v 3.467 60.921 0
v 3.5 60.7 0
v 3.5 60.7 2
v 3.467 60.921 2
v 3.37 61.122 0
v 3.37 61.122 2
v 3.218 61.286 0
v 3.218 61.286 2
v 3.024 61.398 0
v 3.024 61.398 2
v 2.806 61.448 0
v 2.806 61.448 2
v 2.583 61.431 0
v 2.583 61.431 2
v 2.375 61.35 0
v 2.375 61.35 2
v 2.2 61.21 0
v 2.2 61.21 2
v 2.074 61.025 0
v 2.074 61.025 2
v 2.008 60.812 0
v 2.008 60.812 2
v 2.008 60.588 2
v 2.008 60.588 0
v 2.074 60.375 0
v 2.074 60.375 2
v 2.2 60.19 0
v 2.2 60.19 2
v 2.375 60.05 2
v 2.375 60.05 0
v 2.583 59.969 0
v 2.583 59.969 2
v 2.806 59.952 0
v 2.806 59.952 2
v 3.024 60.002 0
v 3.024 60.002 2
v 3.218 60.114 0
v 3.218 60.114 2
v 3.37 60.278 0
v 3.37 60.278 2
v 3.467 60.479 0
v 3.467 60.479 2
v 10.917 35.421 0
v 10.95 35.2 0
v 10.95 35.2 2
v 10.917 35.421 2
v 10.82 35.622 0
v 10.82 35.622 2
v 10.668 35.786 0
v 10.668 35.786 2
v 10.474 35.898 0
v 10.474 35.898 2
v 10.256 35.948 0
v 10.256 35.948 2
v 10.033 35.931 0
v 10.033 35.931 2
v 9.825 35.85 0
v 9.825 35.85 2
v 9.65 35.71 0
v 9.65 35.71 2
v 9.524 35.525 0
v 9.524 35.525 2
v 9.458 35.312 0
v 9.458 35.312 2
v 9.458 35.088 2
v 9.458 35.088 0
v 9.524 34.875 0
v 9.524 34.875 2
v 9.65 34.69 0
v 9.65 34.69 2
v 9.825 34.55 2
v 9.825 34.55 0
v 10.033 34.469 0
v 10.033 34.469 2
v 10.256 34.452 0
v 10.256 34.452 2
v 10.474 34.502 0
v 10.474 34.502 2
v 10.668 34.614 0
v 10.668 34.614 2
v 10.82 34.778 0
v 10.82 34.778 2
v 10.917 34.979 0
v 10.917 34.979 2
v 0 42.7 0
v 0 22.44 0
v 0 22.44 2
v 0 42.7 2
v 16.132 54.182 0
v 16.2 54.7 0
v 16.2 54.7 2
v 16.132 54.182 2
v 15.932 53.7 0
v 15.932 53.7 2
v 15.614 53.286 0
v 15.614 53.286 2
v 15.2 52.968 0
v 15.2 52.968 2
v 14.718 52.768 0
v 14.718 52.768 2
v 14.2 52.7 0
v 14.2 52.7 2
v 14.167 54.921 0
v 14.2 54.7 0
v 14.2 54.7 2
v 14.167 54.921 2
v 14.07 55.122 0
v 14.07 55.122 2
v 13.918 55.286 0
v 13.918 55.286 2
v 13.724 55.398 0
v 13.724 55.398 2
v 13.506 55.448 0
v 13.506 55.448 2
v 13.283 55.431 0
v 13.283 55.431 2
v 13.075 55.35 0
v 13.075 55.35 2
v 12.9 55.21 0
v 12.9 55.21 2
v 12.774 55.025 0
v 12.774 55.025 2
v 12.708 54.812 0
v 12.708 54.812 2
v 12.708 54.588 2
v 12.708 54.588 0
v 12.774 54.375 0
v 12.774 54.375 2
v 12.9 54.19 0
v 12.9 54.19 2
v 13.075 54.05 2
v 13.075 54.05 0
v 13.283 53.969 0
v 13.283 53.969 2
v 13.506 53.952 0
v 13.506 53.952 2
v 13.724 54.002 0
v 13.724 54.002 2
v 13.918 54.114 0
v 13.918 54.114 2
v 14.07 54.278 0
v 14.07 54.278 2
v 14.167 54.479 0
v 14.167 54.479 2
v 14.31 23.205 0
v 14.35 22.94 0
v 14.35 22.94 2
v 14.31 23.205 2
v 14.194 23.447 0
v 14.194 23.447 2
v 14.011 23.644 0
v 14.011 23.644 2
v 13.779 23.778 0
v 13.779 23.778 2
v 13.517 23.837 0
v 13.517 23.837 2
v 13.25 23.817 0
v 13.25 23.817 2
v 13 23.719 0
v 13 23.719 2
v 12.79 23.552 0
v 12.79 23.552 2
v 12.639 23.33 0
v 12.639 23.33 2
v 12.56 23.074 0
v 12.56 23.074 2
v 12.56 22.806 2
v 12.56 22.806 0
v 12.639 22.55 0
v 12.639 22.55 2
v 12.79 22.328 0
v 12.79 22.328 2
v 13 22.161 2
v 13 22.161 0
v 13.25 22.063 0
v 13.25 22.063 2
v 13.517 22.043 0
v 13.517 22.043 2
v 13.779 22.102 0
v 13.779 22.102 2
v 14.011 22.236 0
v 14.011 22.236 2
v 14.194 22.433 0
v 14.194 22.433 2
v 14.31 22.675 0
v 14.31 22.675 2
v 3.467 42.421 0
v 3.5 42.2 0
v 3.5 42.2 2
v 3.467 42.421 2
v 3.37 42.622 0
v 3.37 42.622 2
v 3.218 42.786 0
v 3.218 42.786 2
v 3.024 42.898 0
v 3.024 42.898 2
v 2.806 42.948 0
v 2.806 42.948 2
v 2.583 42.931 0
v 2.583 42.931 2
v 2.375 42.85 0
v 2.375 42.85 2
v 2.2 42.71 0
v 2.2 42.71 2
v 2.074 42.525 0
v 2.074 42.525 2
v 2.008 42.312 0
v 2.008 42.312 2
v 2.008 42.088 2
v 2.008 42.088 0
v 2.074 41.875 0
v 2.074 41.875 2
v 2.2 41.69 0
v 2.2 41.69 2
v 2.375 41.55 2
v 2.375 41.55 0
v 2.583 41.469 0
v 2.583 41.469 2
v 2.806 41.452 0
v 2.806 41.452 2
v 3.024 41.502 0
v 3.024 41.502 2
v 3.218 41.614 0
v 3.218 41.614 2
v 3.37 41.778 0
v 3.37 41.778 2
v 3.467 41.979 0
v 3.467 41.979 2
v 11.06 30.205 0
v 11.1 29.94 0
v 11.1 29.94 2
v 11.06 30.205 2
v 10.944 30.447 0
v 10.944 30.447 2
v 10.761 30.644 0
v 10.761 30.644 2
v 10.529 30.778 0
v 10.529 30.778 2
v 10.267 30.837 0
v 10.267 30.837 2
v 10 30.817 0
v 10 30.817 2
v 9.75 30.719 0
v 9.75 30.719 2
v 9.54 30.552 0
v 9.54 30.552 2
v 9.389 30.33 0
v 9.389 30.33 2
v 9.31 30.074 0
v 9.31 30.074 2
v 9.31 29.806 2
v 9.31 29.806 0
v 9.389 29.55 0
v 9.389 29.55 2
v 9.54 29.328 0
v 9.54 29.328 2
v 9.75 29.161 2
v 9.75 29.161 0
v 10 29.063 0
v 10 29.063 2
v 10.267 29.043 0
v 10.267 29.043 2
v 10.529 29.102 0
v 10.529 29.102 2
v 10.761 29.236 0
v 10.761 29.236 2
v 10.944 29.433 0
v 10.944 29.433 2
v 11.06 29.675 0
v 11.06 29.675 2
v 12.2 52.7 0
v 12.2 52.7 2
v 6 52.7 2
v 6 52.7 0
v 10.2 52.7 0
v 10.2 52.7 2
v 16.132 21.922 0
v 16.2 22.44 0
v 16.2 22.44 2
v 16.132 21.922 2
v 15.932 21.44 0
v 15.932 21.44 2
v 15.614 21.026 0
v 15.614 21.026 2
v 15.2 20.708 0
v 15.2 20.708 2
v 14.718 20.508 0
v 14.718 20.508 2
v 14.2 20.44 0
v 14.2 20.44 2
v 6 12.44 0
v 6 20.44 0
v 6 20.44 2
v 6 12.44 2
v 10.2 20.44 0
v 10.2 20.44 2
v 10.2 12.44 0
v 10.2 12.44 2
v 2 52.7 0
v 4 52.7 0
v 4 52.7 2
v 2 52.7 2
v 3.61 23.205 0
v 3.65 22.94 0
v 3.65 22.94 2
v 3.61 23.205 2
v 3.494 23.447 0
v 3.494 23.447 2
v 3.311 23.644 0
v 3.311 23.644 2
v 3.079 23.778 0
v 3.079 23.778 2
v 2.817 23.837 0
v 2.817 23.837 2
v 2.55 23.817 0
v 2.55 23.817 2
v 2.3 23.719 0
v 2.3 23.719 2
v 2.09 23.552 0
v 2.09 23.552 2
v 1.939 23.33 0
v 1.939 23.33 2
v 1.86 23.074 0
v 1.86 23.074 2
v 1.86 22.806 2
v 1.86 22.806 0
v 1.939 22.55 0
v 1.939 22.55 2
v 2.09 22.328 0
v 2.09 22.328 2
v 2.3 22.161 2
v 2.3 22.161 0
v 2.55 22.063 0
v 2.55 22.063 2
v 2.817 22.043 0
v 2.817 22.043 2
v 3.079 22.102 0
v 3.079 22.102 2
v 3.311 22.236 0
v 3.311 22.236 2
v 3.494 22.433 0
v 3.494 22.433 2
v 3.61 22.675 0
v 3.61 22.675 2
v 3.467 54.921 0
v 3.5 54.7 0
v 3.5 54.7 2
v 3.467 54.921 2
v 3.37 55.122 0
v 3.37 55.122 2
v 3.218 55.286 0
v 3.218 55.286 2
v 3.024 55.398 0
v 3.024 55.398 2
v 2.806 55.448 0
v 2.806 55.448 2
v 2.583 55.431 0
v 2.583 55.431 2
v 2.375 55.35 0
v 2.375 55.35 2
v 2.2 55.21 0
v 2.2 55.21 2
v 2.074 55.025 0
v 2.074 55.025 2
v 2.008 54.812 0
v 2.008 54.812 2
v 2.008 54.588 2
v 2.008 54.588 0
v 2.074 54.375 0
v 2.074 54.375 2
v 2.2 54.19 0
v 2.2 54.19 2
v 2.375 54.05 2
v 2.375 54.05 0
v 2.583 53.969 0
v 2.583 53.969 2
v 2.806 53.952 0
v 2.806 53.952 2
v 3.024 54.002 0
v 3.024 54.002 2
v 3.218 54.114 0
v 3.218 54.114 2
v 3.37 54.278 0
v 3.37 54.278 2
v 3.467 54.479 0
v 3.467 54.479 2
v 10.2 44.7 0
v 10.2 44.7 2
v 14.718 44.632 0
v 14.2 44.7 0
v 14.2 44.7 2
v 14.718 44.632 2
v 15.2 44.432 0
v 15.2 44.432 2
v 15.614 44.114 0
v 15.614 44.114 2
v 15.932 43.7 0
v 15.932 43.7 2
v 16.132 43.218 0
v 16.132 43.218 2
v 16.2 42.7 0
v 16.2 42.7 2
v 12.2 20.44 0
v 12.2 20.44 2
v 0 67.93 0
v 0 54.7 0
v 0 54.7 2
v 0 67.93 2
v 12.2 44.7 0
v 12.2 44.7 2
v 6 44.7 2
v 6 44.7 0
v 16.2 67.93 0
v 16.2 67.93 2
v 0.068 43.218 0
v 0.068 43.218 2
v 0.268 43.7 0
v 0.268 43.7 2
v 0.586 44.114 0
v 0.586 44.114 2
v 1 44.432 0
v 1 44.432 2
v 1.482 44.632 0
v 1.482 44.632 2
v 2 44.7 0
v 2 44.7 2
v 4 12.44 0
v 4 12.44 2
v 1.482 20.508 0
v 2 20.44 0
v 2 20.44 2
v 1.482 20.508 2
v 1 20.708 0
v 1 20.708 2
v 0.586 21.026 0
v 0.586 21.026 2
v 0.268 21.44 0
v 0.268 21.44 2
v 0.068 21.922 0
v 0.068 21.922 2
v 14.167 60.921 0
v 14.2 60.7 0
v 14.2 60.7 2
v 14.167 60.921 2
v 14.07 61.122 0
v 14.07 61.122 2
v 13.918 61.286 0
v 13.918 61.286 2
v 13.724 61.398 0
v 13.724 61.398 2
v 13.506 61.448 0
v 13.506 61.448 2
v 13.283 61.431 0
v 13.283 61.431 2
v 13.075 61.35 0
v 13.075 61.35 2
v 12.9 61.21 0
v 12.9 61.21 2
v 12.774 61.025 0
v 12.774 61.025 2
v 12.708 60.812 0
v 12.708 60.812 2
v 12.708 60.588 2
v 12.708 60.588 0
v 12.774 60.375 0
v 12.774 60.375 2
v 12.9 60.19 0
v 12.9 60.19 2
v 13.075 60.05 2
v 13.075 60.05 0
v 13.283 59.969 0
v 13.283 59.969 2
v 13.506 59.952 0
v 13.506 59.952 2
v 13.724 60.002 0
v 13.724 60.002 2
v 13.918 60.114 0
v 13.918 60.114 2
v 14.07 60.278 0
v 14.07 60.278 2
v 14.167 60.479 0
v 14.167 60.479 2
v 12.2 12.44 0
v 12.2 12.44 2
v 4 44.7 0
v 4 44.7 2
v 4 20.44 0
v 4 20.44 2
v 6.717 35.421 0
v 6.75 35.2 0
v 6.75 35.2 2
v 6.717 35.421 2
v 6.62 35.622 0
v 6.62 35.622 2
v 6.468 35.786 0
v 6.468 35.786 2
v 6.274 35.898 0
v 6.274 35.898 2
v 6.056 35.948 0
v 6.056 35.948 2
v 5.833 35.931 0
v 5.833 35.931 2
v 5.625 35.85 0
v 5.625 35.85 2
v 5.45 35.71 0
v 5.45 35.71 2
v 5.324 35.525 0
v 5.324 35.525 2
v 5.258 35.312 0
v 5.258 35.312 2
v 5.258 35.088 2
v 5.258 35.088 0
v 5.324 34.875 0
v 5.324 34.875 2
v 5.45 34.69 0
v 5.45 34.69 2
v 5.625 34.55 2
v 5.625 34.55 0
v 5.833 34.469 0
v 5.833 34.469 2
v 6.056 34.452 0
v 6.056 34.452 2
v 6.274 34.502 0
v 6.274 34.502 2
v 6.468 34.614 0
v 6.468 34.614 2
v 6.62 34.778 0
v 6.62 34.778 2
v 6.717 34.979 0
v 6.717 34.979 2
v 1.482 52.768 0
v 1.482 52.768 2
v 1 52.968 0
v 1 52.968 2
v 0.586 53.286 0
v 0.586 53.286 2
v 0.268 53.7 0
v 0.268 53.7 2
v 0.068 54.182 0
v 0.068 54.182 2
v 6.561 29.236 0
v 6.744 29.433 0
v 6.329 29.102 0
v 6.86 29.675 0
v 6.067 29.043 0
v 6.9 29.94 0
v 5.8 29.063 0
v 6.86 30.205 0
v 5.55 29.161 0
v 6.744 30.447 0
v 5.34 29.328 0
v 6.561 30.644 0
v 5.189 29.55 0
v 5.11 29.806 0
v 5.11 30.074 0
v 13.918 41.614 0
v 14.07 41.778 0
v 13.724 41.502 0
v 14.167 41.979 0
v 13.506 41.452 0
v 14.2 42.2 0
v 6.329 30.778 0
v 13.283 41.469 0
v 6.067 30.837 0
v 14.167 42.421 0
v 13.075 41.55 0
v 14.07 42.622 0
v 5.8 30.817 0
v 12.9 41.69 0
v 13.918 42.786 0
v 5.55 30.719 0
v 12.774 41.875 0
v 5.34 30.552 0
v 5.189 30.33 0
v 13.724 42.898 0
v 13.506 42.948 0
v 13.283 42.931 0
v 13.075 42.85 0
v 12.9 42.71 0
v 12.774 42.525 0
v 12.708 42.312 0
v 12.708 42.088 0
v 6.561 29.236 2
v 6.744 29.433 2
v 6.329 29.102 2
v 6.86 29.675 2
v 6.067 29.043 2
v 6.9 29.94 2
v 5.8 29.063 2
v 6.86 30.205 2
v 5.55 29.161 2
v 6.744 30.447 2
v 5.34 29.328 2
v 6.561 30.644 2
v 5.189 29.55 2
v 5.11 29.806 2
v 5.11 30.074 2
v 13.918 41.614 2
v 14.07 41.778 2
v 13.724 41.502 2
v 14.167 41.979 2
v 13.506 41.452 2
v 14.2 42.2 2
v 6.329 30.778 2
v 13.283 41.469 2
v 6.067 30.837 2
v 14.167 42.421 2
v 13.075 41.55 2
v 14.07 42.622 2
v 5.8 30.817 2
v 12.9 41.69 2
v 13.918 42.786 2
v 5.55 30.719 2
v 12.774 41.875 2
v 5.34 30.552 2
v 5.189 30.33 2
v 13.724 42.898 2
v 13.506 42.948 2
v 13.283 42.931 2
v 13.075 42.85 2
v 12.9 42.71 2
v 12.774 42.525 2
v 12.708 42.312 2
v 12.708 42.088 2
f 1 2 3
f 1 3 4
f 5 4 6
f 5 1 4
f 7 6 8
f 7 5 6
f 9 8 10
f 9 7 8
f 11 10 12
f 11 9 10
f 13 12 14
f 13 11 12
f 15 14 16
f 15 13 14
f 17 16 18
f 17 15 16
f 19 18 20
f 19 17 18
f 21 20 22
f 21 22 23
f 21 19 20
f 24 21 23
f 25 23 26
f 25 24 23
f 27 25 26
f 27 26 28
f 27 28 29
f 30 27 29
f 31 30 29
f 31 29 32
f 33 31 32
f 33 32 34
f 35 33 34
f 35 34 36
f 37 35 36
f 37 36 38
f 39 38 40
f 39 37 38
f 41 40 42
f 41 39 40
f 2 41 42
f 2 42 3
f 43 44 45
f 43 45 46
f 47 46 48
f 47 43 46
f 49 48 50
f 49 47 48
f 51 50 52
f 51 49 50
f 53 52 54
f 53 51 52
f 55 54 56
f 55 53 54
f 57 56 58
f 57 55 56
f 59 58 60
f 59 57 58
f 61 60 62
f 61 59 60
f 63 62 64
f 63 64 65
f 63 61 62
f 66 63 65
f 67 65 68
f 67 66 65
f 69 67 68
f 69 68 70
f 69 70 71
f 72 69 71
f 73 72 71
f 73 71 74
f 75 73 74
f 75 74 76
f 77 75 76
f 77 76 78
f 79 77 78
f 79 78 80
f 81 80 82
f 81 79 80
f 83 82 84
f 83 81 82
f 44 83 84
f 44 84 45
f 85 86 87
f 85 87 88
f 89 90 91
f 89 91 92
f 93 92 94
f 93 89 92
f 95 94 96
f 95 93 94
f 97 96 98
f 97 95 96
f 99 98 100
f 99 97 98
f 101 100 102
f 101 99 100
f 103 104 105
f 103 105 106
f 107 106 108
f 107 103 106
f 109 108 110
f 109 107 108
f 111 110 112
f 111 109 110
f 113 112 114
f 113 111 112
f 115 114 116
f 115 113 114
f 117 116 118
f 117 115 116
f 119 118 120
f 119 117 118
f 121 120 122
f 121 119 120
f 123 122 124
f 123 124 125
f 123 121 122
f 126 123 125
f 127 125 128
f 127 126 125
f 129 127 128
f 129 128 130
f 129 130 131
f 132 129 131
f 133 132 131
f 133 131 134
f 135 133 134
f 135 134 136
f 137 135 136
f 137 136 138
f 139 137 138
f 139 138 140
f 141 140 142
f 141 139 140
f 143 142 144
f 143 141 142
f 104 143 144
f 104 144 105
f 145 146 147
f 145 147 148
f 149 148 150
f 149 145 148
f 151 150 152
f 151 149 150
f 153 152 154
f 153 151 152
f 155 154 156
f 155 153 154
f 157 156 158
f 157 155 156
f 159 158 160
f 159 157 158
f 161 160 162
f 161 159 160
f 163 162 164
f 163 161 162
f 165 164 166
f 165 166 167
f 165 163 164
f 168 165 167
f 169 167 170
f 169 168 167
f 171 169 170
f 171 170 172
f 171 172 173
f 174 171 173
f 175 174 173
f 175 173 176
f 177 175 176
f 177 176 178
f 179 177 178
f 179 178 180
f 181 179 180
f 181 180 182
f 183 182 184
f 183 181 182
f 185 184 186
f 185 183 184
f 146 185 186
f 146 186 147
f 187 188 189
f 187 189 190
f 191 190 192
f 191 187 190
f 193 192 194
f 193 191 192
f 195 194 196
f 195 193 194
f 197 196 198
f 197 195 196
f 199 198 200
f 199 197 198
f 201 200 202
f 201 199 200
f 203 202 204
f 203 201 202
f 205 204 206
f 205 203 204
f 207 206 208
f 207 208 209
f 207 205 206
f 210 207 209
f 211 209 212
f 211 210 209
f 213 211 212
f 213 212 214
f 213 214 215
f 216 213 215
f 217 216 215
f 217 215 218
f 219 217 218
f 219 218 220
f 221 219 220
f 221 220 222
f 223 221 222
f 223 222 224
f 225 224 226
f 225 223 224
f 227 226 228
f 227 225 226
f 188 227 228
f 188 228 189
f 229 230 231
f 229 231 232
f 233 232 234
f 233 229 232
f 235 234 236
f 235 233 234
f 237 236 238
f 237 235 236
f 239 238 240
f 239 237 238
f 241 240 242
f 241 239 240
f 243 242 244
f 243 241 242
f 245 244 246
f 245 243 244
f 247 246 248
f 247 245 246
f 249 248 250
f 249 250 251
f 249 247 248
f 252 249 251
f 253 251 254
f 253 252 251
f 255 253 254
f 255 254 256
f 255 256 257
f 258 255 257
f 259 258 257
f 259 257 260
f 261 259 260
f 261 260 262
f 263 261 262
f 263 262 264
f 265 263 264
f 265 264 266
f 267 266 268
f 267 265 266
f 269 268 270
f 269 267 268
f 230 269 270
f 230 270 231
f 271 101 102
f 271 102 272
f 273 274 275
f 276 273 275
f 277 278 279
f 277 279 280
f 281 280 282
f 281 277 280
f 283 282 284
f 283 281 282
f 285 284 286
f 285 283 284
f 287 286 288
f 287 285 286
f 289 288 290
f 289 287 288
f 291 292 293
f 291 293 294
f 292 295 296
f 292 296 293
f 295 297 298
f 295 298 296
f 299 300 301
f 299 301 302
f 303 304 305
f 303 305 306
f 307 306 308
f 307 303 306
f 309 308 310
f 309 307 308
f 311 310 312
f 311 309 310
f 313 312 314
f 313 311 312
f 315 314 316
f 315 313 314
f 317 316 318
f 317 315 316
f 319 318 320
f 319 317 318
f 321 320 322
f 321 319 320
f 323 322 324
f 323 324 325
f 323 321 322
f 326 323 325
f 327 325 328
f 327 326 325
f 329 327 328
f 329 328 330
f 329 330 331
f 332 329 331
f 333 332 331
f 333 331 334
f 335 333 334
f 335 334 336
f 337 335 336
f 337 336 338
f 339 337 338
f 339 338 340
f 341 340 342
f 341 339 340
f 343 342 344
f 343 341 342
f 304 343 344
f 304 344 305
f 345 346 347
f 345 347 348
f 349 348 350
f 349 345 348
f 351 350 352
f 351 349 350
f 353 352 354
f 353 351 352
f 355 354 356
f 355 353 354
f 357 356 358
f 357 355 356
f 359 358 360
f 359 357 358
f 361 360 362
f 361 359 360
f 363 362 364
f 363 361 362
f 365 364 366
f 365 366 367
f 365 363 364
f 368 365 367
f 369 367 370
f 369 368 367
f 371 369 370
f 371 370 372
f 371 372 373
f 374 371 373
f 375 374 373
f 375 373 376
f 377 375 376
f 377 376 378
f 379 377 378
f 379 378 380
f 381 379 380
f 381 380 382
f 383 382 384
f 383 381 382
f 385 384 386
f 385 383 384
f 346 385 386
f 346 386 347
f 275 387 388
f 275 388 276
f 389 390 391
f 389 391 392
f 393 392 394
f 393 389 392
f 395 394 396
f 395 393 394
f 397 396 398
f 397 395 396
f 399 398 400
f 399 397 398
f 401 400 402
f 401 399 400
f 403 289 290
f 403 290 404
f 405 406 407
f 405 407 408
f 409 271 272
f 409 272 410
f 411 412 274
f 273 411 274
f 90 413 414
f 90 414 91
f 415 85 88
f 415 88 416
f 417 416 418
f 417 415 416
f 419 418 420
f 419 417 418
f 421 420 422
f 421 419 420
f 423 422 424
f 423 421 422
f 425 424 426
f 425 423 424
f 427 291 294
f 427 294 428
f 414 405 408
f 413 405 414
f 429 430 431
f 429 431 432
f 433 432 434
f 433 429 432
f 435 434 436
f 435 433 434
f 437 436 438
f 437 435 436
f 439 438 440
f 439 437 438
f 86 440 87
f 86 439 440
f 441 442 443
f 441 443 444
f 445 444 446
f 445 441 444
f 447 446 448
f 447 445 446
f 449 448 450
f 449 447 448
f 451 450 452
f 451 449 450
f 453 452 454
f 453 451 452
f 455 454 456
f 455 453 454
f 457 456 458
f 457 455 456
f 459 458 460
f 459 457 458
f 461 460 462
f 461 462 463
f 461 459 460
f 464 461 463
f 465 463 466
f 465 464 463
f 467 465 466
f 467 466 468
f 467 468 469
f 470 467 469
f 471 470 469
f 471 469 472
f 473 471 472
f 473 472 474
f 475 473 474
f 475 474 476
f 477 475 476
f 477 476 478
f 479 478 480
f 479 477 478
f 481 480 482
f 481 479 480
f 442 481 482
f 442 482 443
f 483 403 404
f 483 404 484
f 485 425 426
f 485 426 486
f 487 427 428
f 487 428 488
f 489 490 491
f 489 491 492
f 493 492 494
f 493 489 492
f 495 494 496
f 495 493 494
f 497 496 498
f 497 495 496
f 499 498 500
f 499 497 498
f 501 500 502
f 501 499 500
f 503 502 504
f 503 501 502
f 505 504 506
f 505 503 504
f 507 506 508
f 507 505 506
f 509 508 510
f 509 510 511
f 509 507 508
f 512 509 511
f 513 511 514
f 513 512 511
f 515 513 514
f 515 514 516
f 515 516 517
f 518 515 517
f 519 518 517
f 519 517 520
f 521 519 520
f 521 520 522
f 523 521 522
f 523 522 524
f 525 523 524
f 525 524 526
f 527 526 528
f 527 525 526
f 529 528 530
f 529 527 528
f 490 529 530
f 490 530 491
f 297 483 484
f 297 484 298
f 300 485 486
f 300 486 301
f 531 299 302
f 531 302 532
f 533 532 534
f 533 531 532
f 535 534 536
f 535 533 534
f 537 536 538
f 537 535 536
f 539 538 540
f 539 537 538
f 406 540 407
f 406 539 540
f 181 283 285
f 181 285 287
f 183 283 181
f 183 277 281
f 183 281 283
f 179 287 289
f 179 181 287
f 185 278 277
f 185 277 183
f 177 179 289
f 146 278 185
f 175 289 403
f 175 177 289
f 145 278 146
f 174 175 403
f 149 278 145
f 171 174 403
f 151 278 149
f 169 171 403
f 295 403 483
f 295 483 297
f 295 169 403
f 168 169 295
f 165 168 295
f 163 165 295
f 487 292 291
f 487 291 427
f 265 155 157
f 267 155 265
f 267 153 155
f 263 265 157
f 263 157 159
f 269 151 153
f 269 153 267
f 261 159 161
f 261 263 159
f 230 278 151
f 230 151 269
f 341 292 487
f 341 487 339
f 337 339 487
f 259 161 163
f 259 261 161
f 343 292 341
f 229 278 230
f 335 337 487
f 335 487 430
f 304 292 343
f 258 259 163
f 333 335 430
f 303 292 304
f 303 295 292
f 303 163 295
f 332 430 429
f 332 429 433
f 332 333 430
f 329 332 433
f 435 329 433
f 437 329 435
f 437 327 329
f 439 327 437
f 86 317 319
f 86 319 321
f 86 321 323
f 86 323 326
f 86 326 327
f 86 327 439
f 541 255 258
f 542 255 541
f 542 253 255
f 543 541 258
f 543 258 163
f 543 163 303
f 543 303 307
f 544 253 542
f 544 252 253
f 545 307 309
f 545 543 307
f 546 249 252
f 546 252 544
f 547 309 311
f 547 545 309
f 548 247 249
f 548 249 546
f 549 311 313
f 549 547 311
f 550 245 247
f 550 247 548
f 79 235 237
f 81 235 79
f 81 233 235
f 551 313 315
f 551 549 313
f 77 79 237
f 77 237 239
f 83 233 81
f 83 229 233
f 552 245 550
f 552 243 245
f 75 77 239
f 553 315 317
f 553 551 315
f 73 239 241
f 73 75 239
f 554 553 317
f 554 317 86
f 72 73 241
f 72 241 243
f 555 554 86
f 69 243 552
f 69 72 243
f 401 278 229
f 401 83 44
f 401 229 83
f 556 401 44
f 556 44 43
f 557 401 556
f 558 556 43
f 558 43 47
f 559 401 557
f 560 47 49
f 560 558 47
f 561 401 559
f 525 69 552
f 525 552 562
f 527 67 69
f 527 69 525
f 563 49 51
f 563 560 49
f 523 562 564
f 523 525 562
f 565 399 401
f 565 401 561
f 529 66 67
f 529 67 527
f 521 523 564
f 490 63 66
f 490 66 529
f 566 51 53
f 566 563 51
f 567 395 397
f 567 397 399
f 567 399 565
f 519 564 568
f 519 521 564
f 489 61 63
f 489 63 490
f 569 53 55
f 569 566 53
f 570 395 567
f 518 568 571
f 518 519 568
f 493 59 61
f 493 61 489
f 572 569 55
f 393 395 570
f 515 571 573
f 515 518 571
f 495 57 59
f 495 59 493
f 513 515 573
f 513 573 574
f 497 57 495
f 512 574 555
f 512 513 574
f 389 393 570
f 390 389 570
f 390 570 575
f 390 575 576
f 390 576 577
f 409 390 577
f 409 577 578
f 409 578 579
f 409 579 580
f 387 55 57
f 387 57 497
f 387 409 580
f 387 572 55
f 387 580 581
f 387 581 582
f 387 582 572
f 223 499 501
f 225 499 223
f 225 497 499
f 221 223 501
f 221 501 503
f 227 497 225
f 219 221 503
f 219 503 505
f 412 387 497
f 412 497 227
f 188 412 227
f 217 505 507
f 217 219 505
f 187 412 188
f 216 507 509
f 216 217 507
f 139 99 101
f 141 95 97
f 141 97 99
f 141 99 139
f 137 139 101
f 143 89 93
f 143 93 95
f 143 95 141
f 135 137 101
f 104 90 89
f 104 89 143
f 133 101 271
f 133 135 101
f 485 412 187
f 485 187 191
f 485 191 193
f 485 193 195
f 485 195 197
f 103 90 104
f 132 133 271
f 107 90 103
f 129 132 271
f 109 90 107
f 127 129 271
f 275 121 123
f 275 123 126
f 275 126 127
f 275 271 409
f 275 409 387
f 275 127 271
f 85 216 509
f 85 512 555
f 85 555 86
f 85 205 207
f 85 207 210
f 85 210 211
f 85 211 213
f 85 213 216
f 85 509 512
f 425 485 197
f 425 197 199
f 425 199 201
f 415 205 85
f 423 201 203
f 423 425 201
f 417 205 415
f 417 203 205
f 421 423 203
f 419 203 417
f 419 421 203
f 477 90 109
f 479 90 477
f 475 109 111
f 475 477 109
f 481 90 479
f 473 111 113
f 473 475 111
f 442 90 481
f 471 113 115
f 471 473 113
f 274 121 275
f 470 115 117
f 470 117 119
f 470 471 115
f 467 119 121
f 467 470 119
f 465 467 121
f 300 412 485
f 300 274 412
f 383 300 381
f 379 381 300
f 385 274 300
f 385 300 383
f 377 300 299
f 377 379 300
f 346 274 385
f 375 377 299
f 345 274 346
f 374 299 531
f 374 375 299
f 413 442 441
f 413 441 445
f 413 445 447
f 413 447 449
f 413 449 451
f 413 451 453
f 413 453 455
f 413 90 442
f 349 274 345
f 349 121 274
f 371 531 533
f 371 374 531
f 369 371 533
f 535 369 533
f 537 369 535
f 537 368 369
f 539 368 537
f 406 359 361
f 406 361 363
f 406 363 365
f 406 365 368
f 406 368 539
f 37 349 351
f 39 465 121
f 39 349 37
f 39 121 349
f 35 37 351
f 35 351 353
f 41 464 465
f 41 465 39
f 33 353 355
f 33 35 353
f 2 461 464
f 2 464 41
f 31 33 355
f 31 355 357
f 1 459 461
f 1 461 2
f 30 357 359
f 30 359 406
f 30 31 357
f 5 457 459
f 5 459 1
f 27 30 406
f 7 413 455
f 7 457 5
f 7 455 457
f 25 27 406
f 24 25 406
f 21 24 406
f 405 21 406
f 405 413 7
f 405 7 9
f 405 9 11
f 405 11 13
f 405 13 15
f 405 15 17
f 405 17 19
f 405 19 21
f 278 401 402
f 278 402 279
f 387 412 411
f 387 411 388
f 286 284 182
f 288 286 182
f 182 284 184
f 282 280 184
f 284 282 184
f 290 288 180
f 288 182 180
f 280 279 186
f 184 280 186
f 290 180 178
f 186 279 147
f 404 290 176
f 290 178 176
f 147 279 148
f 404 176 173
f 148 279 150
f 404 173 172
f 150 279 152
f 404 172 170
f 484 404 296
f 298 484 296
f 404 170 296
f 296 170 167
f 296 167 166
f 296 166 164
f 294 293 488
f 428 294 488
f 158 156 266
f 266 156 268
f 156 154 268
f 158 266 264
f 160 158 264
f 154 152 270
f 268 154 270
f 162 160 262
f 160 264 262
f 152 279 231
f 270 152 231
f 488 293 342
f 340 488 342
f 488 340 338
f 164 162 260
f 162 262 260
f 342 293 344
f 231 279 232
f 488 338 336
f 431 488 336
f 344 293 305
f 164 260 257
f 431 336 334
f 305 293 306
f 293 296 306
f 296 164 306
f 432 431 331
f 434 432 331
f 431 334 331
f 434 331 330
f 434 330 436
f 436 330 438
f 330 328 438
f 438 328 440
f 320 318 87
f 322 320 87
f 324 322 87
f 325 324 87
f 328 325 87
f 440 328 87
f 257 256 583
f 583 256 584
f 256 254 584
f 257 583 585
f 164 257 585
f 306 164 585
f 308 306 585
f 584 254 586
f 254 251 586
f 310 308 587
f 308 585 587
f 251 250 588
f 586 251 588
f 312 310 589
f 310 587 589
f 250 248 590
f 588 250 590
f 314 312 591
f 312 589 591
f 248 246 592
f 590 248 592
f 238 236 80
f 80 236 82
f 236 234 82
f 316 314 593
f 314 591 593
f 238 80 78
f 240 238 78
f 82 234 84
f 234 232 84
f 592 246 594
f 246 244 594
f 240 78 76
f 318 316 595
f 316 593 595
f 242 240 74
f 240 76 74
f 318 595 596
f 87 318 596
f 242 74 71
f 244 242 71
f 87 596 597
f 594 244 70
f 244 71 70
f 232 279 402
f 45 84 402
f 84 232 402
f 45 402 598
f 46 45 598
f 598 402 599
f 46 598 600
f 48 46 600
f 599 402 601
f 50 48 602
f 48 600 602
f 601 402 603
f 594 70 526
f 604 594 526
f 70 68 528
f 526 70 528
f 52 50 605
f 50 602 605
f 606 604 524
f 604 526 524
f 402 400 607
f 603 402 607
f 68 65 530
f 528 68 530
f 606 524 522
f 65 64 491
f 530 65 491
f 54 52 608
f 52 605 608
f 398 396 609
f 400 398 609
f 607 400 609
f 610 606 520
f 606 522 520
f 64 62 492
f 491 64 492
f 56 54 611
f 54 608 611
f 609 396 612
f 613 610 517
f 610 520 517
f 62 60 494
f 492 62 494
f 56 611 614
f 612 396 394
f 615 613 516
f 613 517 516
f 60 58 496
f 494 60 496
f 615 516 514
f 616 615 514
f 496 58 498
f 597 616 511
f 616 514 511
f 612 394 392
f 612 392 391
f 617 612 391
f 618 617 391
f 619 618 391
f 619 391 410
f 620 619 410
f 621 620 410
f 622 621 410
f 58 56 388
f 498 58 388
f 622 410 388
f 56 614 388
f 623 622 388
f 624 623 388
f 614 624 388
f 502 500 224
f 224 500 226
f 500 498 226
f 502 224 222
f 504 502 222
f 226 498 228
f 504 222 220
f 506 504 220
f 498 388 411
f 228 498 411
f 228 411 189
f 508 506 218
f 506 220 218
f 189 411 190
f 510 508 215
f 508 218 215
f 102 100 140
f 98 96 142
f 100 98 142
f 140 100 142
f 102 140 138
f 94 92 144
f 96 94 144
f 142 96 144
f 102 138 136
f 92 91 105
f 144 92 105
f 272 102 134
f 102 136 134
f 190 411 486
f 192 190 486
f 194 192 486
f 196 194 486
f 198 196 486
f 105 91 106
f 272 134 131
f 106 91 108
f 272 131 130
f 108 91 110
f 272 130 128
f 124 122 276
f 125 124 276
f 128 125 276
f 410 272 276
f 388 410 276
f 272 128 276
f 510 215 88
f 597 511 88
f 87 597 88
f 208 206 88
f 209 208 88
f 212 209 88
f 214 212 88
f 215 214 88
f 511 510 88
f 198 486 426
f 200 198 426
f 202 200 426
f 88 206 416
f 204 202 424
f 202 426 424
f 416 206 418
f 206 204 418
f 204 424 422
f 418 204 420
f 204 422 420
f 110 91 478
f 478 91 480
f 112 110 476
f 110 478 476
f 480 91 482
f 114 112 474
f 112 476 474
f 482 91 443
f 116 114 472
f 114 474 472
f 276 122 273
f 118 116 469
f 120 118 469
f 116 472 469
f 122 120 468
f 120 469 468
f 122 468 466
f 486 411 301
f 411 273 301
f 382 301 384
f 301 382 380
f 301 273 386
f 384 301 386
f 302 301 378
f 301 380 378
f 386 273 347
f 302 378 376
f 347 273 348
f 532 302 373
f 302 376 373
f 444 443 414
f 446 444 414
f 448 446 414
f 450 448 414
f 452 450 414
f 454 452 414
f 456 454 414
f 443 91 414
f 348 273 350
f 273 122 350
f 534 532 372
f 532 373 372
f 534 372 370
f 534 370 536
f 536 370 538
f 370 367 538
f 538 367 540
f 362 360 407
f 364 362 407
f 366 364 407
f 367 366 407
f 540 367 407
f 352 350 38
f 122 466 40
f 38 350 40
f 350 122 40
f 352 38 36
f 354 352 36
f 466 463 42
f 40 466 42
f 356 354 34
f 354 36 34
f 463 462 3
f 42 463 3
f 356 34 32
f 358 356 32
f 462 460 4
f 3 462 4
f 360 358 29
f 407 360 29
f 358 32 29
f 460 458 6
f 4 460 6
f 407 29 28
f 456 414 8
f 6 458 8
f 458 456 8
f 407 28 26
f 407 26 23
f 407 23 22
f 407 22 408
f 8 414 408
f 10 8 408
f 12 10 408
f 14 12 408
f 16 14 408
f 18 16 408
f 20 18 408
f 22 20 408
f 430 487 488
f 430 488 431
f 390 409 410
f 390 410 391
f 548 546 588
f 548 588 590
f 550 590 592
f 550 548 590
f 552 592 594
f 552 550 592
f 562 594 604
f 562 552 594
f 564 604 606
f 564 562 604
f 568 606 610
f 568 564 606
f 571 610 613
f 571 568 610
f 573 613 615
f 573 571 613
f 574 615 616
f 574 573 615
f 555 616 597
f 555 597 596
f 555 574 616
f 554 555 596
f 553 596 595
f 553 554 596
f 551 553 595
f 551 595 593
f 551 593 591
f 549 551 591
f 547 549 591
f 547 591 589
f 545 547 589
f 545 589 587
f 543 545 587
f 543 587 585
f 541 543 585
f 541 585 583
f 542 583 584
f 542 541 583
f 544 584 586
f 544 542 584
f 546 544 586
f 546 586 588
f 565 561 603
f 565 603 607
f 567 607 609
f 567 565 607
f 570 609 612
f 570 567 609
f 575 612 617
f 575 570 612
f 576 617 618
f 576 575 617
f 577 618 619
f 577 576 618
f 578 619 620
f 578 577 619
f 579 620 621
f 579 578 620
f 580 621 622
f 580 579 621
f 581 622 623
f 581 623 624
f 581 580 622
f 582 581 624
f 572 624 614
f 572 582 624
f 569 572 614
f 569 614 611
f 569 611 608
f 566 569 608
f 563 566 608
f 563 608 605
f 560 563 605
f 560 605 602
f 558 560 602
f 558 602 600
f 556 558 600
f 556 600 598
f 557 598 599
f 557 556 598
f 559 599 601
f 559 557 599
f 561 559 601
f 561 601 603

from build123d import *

# Parameters (mm, degrees)
SKETCH1_R           = 0.75
SKETCH1_R_2         = 0.9
SKETCH1_W           = 4.2
SKETCH1_H           = 8
BOSS_EXTRUDE1_DEPTH = 2


with BuildPart() as part:
    # Sketch1 → Boss-Extrude1 (new body)
    with BuildSketch(Plane.XY):
        with BuildLine():
            Line((4, 44.7), (4, 52.7))
            Line((4, 52.7), (2, 52.7))
            ThreePointArc((2, 52.7), (0.585786438, 53.285786438), (0, 54.7))
            Line((0, 54.7), (0, 67.93))
            Line((0, 67.93), (16.2, 67.93))
            Line((16.2, 67.93), (16.2, 54.7))
            ThreePointArc((16.2, 54.7), (15.614213562, 53.285786438), (14.2, 52.7))
            Line((14.2, 52.7), (12.2, 52.7))
            Line((12.2, 52.7), (12.2, 44.7))
            Line((12.2, 44.7), (14.2, 44.7))
            ThreePointArc((14.2, 44.7), (15.614213562, 44.114213562), (16.2, 42.7))
            Line((16.2, 42.7), (16.2, 22.44))
            ThreePointArc((16.2, 22.44), (15.614213562, 21.025786438), (14.2, 20.44))
            Line((14.2, 20.44), (12.2, 20.44))
            Line((12.2, 20.44), (12.2, 12.44))
            Line((12.2, 12.44), (10.2, 12.44))
            Line((10.2, 12.44), (10.2, 20.44))
            Line((10.2, 20.44), (6, 20.44))
            Line((6, 20.44), (6, 12.44))
            Line((6, 12.44), (4, 12.44))
            Line((4, 12.44), (4, 20.44))
            Line((4, 20.44), (2, 20.44))
            ThreePointArc((2, 20.44), (0.585786438, 21.025786438), (0, 22.44))
            Line((0, 22.44), (0, 42.7))
            ThreePointArc((0, 42.7), (0.585786438, 44.114213562), (2, 44.7))
            Line((2, 44.7), (4, 44.7))
        make_face()
        with Locations((2.75, 60.7)):
            Circle(SKETCH1_R, mode=Mode.SUBTRACT)
        with Locations((13.45, 54.7)):
            Circle(SKETCH1_R, mode=Mode.SUBTRACT)
        with Locations((13.45, 42.2)):
            Circle(SKETCH1_R, mode=Mode.SUBTRACT)
        with Locations((13.45, 22.94)):
            Circle(SKETCH1_R_2, mode=Mode.SUBTRACT)
        with Locations((10.2, 29.94)):
            Circle(SKETCH1_R_2, mode=Mode.SUBTRACT)
        with Locations((6, 35.2)):
            Circle(SKETCH1_R, mode=Mode.SUBTRACT)
        with Locations((13.45, 60.7)):
            Circle(SKETCH1_R, mode=Mode.SUBTRACT)
        with Locations((10.2, 35.2)):
            Circle(SKETCH1_R, mode=Mode.SUBTRACT)
        with Locations((6, 29.94)):
            Circle(SKETCH1_R_2, mode=Mode.SUBTRACT)
        with Locations((2.75, 22.94)):
            Circle(SKETCH1_R_2, mode=Mode.SUBTRACT)
        with Locations((2.75, 42.2)):
            Circle(SKETCH1_R, mode=Mode.SUBTRACT)
        with Locations((2.75, 54.7)):
            Circle(SKETCH1_R, mode=Mode.SUBTRACT)
        with Locations((8.1, 48.7)):
            Rectangle(SKETCH1_W, SKETCH1_H, mode=Mode.SUBTRACT)
    extrude(amount=BOSS_EXTRUDE1_DEPTH)


solid = part.part
